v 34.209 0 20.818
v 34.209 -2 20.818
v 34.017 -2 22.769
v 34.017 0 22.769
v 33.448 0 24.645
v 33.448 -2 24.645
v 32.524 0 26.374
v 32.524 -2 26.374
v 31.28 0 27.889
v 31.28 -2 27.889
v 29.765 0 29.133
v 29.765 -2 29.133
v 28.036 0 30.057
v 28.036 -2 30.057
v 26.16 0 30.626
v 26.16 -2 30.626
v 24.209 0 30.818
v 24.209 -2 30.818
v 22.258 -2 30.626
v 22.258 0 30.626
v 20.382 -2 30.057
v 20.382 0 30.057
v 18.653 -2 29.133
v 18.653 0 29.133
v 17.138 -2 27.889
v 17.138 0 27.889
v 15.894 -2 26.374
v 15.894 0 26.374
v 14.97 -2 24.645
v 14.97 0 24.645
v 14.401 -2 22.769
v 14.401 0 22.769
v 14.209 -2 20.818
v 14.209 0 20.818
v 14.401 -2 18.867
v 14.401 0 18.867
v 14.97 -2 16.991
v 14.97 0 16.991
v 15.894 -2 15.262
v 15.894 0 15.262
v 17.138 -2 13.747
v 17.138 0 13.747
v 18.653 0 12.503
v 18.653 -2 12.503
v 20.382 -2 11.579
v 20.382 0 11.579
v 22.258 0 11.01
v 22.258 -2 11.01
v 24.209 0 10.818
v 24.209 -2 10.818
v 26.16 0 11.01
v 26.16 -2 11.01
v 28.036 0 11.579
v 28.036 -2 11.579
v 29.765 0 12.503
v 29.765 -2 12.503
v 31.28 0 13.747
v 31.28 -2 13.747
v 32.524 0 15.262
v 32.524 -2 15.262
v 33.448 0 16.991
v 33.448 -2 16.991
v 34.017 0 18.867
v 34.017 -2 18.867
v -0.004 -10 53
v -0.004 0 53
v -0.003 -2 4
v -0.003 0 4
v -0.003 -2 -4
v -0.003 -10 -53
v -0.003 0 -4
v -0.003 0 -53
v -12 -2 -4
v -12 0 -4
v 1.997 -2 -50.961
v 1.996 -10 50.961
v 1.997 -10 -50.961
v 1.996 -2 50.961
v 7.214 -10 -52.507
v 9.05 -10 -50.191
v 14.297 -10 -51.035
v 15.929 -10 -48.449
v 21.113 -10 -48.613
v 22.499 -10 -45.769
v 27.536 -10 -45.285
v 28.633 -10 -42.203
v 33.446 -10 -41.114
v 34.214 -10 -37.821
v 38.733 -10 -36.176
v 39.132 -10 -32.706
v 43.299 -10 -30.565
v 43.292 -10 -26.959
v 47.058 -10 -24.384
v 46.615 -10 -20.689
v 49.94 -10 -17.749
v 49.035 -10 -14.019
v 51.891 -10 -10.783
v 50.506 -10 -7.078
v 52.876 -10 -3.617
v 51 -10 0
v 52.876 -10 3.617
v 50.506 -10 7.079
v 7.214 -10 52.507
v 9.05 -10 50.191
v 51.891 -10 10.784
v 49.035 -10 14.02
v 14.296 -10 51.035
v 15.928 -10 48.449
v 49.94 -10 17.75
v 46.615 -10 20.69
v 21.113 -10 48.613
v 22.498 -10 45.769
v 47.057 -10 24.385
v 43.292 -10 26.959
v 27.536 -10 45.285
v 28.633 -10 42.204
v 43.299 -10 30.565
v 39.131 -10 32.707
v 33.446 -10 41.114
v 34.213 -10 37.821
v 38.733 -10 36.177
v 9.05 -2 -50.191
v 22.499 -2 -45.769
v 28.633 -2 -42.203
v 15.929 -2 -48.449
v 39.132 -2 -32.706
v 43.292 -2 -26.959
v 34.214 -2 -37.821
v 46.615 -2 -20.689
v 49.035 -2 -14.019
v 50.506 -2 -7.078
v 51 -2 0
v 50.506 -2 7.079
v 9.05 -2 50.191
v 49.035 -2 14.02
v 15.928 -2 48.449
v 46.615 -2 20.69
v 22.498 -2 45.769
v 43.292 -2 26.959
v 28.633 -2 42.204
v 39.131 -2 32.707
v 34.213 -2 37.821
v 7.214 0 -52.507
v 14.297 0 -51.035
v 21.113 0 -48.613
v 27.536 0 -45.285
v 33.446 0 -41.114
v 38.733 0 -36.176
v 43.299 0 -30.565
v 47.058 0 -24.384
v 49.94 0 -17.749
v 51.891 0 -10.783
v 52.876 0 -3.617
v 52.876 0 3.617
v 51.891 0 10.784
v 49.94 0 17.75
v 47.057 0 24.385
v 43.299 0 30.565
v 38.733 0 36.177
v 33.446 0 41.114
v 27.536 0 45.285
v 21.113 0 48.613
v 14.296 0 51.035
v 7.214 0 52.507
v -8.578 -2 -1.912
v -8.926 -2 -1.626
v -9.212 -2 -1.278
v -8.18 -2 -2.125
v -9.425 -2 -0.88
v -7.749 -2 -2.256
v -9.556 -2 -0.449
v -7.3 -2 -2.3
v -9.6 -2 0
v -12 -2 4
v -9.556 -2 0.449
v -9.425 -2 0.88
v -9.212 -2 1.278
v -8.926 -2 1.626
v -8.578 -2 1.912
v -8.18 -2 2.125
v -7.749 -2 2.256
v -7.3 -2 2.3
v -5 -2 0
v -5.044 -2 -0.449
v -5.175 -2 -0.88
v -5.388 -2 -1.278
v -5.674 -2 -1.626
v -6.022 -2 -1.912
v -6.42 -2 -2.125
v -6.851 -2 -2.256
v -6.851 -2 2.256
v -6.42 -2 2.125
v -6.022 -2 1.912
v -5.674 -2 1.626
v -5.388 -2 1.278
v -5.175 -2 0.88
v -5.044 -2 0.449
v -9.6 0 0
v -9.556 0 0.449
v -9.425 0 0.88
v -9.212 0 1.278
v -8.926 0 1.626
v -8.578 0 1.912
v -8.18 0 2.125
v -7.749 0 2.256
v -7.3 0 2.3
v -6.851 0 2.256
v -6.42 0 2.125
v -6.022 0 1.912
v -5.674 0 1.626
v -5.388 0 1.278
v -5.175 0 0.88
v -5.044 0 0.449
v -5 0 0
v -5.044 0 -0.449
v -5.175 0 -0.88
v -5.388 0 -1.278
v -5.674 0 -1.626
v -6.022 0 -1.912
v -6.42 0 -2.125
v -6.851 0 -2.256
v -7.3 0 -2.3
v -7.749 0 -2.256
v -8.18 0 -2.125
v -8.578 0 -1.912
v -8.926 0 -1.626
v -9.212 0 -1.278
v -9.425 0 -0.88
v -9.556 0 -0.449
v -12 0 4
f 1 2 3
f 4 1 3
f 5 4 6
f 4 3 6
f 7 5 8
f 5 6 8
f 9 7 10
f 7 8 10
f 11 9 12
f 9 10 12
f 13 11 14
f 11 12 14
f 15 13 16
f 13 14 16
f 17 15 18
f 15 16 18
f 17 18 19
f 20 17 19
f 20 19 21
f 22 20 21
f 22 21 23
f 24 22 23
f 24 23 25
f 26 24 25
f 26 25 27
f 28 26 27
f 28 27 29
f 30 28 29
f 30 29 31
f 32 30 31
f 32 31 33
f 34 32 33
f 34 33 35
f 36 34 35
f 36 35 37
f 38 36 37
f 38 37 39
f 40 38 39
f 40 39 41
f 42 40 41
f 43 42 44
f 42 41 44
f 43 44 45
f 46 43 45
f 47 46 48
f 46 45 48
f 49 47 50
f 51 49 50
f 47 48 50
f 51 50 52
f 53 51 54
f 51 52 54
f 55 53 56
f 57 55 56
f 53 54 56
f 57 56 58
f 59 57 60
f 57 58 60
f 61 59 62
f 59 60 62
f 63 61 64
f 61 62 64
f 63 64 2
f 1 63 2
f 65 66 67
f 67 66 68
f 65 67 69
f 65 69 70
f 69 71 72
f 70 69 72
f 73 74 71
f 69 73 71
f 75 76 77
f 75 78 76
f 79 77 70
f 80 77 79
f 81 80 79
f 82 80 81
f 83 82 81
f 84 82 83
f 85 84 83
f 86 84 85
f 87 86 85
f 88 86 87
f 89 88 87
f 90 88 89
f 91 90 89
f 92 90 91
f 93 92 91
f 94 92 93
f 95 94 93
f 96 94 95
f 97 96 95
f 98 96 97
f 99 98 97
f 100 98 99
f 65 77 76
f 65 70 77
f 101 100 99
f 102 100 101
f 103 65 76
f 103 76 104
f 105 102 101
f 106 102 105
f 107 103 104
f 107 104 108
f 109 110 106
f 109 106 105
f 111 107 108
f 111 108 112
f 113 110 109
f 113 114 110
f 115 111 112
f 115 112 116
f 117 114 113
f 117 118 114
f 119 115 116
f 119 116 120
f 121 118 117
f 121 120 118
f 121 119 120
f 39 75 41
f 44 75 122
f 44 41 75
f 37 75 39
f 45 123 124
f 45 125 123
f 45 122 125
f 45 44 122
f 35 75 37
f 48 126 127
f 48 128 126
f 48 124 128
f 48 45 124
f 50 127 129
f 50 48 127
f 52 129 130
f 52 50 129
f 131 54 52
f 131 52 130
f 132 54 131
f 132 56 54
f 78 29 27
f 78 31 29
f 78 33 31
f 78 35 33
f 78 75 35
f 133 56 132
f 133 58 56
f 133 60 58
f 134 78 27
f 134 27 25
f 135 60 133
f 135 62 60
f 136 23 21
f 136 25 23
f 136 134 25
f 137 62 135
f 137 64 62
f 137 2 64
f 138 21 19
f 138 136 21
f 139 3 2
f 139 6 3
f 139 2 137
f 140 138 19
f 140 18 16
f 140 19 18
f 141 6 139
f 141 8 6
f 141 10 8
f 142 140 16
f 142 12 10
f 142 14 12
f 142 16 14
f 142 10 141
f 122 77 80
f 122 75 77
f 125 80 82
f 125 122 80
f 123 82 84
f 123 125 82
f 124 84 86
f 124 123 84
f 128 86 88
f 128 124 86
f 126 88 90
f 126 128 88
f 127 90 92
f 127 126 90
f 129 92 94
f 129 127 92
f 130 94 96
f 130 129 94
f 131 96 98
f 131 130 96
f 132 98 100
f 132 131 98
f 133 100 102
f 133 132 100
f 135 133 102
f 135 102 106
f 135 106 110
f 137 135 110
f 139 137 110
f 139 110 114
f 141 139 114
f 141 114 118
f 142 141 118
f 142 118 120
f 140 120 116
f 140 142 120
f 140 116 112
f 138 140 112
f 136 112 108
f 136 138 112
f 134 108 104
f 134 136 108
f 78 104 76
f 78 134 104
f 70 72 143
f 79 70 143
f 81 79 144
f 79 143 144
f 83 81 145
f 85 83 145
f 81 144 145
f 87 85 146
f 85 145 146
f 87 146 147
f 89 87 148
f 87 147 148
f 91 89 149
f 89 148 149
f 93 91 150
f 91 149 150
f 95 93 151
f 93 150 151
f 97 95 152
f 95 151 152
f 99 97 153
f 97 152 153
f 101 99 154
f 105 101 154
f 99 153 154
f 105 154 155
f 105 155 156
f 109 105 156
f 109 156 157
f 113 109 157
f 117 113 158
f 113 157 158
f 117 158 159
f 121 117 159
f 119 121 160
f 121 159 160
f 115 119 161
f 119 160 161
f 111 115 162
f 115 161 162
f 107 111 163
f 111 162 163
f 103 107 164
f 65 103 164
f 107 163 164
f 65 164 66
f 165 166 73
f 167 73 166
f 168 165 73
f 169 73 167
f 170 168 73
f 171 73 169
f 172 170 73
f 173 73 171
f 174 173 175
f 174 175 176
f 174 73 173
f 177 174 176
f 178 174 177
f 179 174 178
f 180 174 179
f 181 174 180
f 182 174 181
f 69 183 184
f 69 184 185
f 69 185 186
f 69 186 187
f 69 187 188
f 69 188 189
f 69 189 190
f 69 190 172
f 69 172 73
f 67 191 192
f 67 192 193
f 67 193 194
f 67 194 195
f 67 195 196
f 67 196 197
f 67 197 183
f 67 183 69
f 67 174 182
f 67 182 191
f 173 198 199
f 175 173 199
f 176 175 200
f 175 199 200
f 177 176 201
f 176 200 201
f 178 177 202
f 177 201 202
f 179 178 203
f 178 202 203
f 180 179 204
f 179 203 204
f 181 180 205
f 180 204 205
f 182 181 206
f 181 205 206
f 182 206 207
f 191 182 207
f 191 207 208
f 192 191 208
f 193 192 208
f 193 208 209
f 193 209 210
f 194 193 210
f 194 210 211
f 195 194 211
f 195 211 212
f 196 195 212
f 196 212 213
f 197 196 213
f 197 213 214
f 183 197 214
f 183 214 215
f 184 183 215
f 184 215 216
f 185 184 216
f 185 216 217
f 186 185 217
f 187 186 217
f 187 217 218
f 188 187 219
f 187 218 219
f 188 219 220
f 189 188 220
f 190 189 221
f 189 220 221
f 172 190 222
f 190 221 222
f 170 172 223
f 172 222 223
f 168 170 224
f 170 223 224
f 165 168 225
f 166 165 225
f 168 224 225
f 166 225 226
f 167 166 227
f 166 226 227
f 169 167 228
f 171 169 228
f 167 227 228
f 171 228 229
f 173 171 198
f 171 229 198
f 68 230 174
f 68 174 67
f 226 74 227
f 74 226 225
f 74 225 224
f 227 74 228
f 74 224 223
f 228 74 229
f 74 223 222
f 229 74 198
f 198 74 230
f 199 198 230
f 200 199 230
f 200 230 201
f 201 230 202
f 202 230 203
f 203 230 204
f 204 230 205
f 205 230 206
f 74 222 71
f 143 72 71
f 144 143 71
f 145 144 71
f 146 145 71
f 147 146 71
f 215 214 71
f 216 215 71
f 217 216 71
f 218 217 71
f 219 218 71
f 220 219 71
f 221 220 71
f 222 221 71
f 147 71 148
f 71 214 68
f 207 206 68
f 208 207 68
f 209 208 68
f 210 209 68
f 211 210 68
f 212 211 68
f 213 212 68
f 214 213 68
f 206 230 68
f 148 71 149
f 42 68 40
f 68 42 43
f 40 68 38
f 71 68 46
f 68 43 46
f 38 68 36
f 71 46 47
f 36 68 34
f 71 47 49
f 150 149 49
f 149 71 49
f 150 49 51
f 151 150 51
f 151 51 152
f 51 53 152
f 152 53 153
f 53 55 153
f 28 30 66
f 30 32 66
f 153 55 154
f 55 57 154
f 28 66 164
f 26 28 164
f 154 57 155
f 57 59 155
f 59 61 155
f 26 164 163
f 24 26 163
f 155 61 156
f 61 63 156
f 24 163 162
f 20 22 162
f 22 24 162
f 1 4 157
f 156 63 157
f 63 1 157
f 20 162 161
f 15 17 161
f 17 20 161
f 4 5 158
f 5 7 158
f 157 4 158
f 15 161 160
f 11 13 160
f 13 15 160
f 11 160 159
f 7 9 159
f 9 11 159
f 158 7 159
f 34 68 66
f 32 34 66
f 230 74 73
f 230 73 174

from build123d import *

# Parameters (mm, degrees)
F1_DEPTH = 10
F2_T     = -2
F3_W     = 12
F3_H     = 8
F4_DEPTH = 2
F5_R     = 2.3
F6_DEPTH = 3
F7_R     = 10
F8_DEPTH = 25


with BuildPart() as f1:
    # F0 (on Front) → F1 (new body)
    with BuildSketch(Plane.XZ):
        with BuildLine():
            Line((-0.003568, 53), (-0.003093, -53))
            ThreePointArc((-0.003093, -53), (53, 0.000237), (-0.003568, 53))
        make_face()
    extrude(amount=F1_DEPTH)

    # F2
    f2_openings = [f1.faces().sort_by_distance(p)[0] for p in [
        (22.492099, -10, 0.000101),
    ]]
    offset(amount=F2_T, openings=f2_openings)

    # F3 (on Front) → F4 (join)
    with BuildSketch(Plane.XZ):
        with Locations((-6, 0)):
            Rectangle(F3_W, F3_H)
    extrude(amount=F4_DEPTH)

    # F5 (on face) → F6 (cut)
    with BuildSketch(Plane(origin=(0, 0, 0), x_dir=(-1, 0, 0), z_dir=(0, 1, 0))):
        with Locations((7.3, 0)):
            Circle(F5_R)
    extrude(amount=-F6_DEPTH, mode=Mode.SUBTRACT)

    # F7 (on face) → F8 (cut)
    with BuildSketch(Plane.XZ.offset(2)):
        with Locations((24.209062, 20.817809)):
            Circle(F7_R)
    extrude(amount=-F8_DEPTH, mode=Mode.SUBTRACT)


solid = f1.part
